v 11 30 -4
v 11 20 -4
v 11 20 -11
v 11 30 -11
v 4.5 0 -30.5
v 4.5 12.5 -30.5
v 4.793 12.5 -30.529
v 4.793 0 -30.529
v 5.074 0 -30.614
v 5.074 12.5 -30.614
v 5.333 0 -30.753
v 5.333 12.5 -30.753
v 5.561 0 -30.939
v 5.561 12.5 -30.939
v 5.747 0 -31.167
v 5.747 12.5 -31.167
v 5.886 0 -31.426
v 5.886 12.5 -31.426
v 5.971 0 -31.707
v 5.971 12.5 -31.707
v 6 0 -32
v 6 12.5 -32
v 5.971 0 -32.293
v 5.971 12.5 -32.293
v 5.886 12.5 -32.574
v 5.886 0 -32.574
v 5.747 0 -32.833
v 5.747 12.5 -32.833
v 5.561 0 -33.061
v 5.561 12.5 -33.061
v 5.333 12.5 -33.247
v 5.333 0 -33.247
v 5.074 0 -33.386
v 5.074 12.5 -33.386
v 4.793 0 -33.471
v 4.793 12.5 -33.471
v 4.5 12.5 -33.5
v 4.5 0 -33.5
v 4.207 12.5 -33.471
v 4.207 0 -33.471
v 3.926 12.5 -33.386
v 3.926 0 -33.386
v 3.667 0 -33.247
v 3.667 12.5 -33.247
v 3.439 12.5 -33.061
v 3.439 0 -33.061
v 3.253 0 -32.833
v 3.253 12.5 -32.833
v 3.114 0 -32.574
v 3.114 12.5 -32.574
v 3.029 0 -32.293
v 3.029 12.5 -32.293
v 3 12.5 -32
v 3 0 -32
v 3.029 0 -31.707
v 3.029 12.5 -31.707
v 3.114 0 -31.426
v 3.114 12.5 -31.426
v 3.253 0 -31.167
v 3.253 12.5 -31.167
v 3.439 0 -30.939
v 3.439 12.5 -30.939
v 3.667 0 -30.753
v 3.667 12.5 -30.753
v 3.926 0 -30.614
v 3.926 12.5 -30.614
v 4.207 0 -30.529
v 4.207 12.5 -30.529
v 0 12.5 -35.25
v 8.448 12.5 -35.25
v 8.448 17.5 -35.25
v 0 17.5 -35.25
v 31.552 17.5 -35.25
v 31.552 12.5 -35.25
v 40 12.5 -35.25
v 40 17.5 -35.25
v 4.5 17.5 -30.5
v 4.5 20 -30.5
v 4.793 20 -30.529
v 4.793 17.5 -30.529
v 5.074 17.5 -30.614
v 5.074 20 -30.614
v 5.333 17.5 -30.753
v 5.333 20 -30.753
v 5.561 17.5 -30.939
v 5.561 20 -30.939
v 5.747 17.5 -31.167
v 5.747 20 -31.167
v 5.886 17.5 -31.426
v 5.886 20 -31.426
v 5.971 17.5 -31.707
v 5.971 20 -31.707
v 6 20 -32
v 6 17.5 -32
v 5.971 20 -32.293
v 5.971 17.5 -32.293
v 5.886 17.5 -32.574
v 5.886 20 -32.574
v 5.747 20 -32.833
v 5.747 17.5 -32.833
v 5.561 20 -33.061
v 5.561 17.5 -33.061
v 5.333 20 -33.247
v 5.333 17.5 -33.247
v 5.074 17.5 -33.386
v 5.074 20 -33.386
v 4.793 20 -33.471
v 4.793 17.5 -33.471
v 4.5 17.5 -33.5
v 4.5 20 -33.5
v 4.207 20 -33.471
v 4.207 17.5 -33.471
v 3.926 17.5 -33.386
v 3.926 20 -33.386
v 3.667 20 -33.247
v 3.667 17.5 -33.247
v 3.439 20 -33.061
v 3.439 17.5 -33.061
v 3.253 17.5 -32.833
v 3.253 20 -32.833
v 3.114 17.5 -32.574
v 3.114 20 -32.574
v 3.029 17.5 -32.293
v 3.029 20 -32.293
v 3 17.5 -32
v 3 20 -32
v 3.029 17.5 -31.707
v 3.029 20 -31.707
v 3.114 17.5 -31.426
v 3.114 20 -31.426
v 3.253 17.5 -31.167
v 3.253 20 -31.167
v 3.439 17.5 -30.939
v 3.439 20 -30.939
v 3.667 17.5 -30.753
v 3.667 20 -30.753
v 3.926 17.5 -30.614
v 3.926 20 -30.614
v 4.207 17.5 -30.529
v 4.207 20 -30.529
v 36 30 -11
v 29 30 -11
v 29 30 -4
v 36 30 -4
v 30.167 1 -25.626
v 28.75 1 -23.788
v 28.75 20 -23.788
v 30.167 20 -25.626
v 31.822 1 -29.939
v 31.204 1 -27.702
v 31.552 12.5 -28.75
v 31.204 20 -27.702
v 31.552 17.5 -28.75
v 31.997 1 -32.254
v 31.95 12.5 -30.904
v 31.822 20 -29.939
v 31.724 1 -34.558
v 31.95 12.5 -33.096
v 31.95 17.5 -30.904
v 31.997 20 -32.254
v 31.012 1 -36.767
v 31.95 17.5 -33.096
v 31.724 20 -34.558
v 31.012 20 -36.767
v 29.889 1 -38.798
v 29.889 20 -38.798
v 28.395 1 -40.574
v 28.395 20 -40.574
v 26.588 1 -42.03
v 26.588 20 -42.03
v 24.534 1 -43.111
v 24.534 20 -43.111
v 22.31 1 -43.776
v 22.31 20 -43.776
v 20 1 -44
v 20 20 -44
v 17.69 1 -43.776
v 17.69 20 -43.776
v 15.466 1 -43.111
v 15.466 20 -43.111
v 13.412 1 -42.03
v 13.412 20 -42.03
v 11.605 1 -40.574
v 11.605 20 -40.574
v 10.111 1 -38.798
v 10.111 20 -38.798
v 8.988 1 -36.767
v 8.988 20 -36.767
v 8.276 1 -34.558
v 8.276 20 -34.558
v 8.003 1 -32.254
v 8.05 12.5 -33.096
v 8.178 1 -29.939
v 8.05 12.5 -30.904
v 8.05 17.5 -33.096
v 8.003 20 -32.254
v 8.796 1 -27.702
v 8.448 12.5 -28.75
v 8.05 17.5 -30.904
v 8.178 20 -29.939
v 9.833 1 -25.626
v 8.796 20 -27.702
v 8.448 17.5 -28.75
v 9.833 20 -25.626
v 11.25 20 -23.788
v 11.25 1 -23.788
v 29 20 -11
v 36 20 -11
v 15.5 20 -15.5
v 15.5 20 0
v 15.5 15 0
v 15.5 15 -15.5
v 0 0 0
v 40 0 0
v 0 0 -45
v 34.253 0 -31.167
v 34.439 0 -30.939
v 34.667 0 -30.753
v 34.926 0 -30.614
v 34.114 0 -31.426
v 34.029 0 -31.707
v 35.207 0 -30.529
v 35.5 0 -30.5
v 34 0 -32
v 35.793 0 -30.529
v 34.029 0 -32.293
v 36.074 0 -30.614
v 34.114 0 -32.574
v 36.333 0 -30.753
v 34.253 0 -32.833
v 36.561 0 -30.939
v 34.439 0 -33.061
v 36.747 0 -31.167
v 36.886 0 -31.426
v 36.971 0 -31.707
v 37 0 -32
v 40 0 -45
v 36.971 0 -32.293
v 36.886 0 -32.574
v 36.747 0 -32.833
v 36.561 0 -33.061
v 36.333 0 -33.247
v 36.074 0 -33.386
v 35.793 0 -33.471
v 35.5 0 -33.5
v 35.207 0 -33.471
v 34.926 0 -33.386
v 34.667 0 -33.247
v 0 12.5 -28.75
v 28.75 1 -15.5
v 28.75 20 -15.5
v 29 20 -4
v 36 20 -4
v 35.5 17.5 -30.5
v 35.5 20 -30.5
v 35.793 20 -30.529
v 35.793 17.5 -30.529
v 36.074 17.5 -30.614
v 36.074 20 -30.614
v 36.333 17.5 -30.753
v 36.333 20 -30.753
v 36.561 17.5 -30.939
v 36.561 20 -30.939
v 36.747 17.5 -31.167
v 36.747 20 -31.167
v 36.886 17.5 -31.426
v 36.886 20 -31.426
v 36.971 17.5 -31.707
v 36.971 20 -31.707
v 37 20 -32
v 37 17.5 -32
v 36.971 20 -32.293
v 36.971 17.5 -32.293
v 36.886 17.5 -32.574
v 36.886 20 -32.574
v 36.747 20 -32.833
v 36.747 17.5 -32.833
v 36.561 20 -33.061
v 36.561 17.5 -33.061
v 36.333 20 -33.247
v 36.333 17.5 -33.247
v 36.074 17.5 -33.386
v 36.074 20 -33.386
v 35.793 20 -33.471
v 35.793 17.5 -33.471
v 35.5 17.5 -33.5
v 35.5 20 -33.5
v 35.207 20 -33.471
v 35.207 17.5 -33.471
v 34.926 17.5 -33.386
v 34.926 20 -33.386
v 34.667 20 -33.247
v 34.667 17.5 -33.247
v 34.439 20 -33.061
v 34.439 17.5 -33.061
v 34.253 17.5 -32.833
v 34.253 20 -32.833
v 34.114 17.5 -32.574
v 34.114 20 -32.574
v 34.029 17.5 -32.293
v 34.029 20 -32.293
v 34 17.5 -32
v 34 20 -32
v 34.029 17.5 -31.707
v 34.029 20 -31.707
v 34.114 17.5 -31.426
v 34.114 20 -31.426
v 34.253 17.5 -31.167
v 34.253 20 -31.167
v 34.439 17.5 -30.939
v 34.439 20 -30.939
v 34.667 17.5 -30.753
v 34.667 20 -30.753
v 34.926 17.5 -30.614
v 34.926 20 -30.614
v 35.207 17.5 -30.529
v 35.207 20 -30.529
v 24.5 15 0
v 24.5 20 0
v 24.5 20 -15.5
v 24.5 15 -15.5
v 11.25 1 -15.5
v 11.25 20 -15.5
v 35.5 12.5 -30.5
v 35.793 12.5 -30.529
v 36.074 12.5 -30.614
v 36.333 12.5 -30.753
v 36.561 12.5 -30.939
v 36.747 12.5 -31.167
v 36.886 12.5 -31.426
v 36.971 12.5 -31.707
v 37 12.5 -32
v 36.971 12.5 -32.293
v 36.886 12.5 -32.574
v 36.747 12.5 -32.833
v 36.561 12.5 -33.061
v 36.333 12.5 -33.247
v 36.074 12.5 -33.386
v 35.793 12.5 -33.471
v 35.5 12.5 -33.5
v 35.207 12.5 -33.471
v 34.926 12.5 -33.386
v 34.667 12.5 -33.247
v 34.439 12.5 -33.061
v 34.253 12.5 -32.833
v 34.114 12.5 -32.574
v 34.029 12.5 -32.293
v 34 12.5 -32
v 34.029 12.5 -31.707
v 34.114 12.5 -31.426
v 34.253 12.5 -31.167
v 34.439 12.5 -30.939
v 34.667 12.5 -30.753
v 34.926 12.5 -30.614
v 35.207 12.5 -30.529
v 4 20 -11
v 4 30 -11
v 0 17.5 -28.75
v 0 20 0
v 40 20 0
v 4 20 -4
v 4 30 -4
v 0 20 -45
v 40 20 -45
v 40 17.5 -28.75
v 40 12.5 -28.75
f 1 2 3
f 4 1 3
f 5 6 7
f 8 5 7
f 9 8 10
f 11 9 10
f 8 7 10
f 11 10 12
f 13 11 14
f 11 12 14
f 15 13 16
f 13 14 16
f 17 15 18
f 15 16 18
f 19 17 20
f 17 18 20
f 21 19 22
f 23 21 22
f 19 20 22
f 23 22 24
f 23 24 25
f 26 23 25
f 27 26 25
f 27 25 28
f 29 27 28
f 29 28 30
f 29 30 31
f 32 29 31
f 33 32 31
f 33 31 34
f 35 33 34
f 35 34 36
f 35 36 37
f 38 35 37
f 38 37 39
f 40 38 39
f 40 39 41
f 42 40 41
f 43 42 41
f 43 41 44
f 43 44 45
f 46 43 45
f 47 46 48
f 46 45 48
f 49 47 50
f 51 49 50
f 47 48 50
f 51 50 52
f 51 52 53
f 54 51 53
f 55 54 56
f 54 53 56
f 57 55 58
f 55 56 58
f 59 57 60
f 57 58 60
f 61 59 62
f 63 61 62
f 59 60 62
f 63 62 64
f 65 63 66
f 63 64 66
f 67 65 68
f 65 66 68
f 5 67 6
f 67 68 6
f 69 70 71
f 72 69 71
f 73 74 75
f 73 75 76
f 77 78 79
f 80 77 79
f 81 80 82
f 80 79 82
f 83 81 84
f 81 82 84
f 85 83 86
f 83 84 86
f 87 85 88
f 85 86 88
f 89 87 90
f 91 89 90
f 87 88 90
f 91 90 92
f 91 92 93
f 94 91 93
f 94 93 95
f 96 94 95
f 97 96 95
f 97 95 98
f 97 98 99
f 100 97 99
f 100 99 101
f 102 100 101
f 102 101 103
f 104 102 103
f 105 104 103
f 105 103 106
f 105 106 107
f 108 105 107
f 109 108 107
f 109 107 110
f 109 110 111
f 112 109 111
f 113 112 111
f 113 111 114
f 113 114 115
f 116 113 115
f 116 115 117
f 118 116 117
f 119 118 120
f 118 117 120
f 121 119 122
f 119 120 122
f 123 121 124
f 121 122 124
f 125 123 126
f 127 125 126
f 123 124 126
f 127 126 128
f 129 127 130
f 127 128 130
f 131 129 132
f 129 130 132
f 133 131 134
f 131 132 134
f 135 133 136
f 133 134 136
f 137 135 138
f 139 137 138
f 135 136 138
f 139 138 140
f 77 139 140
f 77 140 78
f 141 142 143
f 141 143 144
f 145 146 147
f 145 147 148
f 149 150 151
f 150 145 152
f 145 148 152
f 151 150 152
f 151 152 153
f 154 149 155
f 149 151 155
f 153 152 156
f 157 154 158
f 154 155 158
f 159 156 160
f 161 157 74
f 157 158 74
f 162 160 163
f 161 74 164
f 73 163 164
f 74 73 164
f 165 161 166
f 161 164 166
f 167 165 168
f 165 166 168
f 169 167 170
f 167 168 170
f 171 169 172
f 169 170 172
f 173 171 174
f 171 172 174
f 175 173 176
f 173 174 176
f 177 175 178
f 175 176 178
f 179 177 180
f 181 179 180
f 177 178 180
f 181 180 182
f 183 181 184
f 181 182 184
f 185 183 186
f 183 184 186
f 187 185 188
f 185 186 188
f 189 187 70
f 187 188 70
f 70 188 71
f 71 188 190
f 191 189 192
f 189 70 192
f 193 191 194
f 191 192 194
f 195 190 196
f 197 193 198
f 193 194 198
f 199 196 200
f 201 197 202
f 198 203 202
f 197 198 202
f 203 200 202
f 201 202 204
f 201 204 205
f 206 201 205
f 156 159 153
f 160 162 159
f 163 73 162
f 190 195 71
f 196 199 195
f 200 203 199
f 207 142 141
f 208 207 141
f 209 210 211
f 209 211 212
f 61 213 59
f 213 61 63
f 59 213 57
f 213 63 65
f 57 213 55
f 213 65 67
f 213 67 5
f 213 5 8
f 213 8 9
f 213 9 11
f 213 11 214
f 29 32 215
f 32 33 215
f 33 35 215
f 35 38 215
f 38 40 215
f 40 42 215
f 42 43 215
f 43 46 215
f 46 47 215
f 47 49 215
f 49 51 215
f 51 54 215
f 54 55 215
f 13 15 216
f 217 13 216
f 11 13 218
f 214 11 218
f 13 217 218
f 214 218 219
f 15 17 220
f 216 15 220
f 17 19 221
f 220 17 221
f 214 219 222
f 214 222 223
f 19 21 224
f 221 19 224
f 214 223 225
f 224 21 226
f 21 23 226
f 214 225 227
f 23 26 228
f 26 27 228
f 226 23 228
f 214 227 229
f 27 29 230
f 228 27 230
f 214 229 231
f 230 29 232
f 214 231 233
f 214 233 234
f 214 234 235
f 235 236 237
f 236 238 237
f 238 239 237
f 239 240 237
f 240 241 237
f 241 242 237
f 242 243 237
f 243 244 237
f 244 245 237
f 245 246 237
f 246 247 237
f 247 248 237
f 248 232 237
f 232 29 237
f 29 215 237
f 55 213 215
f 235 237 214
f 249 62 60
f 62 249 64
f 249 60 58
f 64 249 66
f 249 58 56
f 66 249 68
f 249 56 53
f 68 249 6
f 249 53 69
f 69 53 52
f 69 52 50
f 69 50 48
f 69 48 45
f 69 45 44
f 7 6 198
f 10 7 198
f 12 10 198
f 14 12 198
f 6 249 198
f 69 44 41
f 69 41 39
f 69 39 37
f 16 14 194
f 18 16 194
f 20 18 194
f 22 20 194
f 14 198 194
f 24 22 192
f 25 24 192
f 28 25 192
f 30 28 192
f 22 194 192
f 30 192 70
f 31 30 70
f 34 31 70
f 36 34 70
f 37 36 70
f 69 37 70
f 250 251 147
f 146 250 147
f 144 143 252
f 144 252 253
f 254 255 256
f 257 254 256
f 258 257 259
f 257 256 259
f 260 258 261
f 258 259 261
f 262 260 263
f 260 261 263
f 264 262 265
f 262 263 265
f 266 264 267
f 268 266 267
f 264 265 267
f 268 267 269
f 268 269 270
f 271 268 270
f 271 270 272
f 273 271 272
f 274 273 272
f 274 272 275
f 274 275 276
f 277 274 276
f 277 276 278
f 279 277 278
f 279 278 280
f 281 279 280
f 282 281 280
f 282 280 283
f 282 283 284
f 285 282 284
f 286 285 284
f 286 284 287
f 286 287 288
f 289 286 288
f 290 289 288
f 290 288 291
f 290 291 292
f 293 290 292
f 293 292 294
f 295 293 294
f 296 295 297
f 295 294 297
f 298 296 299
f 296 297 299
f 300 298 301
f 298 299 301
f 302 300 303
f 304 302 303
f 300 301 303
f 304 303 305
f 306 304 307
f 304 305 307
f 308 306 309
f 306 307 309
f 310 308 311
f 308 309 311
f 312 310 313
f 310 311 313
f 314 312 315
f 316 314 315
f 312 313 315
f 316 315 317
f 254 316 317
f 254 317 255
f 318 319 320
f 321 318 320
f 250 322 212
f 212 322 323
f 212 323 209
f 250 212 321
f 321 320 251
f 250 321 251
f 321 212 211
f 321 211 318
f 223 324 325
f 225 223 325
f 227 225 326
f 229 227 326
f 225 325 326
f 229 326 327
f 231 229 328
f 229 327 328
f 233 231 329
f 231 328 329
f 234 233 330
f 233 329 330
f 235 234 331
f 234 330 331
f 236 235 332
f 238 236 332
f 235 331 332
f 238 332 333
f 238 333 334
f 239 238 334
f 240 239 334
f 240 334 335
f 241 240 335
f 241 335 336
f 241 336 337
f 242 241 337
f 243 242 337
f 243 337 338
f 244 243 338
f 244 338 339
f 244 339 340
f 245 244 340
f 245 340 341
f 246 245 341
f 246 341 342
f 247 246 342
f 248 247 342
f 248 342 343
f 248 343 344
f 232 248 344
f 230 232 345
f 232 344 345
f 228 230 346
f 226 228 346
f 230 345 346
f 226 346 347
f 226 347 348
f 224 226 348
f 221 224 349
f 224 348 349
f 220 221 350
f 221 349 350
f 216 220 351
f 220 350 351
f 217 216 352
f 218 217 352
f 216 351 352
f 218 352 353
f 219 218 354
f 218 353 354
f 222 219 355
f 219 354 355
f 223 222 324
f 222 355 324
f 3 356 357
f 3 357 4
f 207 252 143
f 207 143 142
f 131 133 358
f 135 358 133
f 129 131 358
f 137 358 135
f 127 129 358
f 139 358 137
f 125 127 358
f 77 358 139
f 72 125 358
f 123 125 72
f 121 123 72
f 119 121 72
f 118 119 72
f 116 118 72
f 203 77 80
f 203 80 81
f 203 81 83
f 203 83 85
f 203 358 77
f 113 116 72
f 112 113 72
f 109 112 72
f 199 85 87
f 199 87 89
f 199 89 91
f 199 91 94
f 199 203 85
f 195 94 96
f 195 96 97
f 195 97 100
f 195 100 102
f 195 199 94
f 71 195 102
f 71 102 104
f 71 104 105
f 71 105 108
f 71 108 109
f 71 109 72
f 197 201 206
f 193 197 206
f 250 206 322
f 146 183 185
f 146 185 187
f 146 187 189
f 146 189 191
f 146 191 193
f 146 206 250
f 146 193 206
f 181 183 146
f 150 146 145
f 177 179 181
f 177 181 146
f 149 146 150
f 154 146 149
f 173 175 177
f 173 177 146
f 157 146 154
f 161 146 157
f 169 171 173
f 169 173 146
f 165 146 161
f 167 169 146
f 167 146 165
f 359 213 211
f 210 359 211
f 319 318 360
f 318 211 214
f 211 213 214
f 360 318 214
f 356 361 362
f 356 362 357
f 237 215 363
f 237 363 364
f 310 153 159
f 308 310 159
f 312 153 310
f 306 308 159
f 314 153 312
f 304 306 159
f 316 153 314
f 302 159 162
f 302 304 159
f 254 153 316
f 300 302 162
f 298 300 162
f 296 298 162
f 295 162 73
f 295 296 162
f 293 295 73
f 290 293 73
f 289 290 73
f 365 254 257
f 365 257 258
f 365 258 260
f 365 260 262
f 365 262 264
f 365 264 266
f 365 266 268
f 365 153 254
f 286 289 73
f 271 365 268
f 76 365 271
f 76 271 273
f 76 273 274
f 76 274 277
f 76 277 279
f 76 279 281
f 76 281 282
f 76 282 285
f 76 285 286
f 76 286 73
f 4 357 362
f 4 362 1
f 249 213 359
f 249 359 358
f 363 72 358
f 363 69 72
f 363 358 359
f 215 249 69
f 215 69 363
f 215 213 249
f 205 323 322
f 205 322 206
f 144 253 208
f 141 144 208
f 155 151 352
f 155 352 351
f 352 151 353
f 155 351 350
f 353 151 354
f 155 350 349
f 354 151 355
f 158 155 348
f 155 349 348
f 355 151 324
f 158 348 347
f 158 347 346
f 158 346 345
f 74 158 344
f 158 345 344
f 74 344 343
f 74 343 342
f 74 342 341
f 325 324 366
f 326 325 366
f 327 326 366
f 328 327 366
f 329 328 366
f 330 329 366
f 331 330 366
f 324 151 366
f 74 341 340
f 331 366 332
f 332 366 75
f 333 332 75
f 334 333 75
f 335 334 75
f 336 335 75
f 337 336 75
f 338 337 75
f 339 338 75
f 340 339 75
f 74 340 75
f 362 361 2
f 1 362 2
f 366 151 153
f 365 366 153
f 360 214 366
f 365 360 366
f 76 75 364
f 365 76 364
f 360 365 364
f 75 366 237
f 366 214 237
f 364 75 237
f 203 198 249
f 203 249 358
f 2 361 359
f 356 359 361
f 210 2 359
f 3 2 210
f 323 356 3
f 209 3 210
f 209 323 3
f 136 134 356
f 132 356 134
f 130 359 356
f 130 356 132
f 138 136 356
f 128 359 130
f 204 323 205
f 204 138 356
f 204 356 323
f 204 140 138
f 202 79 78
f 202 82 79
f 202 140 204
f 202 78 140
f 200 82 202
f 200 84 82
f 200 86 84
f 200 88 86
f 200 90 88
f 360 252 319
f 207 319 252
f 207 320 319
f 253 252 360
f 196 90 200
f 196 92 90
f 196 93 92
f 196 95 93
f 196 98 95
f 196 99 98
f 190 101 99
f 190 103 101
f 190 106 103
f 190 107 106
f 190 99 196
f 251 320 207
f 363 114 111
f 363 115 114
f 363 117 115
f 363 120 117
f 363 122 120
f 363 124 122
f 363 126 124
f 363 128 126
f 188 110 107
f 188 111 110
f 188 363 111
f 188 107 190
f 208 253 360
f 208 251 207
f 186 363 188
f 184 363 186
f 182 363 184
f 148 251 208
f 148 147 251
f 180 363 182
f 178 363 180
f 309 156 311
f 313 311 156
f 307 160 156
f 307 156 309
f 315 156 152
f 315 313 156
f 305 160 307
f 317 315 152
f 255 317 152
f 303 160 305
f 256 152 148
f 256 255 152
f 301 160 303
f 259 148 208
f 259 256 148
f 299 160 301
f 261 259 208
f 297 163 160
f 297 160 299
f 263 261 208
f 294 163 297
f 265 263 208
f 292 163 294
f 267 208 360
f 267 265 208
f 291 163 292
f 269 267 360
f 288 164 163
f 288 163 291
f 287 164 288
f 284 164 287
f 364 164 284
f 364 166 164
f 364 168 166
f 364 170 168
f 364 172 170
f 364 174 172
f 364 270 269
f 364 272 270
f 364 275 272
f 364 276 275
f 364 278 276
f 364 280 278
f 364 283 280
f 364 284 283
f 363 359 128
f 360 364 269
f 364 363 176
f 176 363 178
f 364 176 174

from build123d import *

# Parameters (mm, degrees)
ESBO_O2_W                = 40
ESBO_O2_H                = 45
CORPO_DEPTH              = 20
ESBO_O3_R                = 12
ESBO_O3_W                = 17.5
ESBO_O3_H                = 9
ENCAIXE_DO_MOTOR_DEPTH   = 19
ESBO_O5_R                = 1.5
CORTE_EXTRUS_O2_DEPTH    = 64.442887702
ESBO_O6_W                = 6.5
ESBO_O6_H                = 5
CORTE_EXTRUS_O3_DEPTH    = 64.442887702
ESBO_O7_W                = 9
ESBO_O7_H                = 21.613382206
CORTE_EXTRUS_O4_DEPTH    = 5
ESBO_O8_W                = 7
ESBO_O8_H                = 7
RESSALTO_EXTRUS_O2_DEPTH = 10


with BuildPart() as part:
    # Esboço2 → Corpo (new body)
    with BuildSketch(Plane(origin=(0, 0, 0), x_dir=(1, 0, 0), z_dir=(0, 1, 0))):
        with Locations((20, 22.5)):
            Rectangle(ESBO_O2_W, ESBO_O2_H)
    extrude(amount=CORPO_DEPTH)

    # Esboço3 → Encaixe do Motor (cut)
    with BuildSketch(Plane(origin=(0, 20, 0), x_dir=(1, 0, 0), z_dir=(0, 1, 0))):
        with Locations((20, 32)):
            Circle(ESBO_O3_R)
        with Locations((20, 20)):
            Rectangle(ESBO_O3_W, ESBO_O3_H)
    extrude(amount=-ENCAIXE_DO_MOTOR_DEPTH, mode=Mode.SUBTRACT)

    # Esboço5 → Corte-extrusão2 (cut, through all)
    with BuildSketch(Plane(origin=(0, 20, 0), x_dir=(1, 0, 0), z_dir=(0, 1, 0))):
        with Locations(Location((4.5, 32, 0), (0, 0, 270))):
            Circle(ESBO_O5_R)
        with Locations(Location((35.5, 32, 0), (0, 0, 270))):
            Circle(ESBO_O5_R)
    extrude(amount=-CORTE_EXTRUS_O2_DEPTH, mode=Mode.SUBTRACT)

    # Esboço6 → Corte-extrusão3 (cut, through all)
    with BuildSketch(Plane(origin=(40, 0, 0), x_dir=(0, 0, -1), z_dir=(1, 0, 0))):
        with Locations((32, 15)):
            Rectangle(ESBO_O6_W, ESBO_O6_H)
    extrude(amount=-CORTE_EXTRUS_O3_DEPTH, mode=Mode.SUBTRACT)

    # Esboço7 → Corte-extrusão4 (cut)
    with BuildSketch(Plane(origin=(0, 20, 0), x_dir=(1, 0, 0), z_dir=(0, 1, 0))):
        with Locations((20, 7.545181244)):
            Rectangle(ESBO_O7_W, ESBO_O7_H)
    extrude(amount=-CORTE_EXTRUS_O4_DEPTH, mode=Mode.SUBTRACT)

    # Esboço8 → Ressalto-extrusão2 (add)
    with BuildSketch(Plane(origin=(0, 20, 0), x_dir=(1, 0, 0), z_dir=(0, 1, 0))):
        with Locations((32.5, 7.5)):
            Rectangle(ESBO_O8_W, ESBO_O8_H)
        with Locations((7.5, 7.5)):
            Rectangle(ESBO_O8_W, ESBO_O8_H)
    extrude(amount=RESSALTO_EXTRUS_O2_DEPTH)


solid = part.part
